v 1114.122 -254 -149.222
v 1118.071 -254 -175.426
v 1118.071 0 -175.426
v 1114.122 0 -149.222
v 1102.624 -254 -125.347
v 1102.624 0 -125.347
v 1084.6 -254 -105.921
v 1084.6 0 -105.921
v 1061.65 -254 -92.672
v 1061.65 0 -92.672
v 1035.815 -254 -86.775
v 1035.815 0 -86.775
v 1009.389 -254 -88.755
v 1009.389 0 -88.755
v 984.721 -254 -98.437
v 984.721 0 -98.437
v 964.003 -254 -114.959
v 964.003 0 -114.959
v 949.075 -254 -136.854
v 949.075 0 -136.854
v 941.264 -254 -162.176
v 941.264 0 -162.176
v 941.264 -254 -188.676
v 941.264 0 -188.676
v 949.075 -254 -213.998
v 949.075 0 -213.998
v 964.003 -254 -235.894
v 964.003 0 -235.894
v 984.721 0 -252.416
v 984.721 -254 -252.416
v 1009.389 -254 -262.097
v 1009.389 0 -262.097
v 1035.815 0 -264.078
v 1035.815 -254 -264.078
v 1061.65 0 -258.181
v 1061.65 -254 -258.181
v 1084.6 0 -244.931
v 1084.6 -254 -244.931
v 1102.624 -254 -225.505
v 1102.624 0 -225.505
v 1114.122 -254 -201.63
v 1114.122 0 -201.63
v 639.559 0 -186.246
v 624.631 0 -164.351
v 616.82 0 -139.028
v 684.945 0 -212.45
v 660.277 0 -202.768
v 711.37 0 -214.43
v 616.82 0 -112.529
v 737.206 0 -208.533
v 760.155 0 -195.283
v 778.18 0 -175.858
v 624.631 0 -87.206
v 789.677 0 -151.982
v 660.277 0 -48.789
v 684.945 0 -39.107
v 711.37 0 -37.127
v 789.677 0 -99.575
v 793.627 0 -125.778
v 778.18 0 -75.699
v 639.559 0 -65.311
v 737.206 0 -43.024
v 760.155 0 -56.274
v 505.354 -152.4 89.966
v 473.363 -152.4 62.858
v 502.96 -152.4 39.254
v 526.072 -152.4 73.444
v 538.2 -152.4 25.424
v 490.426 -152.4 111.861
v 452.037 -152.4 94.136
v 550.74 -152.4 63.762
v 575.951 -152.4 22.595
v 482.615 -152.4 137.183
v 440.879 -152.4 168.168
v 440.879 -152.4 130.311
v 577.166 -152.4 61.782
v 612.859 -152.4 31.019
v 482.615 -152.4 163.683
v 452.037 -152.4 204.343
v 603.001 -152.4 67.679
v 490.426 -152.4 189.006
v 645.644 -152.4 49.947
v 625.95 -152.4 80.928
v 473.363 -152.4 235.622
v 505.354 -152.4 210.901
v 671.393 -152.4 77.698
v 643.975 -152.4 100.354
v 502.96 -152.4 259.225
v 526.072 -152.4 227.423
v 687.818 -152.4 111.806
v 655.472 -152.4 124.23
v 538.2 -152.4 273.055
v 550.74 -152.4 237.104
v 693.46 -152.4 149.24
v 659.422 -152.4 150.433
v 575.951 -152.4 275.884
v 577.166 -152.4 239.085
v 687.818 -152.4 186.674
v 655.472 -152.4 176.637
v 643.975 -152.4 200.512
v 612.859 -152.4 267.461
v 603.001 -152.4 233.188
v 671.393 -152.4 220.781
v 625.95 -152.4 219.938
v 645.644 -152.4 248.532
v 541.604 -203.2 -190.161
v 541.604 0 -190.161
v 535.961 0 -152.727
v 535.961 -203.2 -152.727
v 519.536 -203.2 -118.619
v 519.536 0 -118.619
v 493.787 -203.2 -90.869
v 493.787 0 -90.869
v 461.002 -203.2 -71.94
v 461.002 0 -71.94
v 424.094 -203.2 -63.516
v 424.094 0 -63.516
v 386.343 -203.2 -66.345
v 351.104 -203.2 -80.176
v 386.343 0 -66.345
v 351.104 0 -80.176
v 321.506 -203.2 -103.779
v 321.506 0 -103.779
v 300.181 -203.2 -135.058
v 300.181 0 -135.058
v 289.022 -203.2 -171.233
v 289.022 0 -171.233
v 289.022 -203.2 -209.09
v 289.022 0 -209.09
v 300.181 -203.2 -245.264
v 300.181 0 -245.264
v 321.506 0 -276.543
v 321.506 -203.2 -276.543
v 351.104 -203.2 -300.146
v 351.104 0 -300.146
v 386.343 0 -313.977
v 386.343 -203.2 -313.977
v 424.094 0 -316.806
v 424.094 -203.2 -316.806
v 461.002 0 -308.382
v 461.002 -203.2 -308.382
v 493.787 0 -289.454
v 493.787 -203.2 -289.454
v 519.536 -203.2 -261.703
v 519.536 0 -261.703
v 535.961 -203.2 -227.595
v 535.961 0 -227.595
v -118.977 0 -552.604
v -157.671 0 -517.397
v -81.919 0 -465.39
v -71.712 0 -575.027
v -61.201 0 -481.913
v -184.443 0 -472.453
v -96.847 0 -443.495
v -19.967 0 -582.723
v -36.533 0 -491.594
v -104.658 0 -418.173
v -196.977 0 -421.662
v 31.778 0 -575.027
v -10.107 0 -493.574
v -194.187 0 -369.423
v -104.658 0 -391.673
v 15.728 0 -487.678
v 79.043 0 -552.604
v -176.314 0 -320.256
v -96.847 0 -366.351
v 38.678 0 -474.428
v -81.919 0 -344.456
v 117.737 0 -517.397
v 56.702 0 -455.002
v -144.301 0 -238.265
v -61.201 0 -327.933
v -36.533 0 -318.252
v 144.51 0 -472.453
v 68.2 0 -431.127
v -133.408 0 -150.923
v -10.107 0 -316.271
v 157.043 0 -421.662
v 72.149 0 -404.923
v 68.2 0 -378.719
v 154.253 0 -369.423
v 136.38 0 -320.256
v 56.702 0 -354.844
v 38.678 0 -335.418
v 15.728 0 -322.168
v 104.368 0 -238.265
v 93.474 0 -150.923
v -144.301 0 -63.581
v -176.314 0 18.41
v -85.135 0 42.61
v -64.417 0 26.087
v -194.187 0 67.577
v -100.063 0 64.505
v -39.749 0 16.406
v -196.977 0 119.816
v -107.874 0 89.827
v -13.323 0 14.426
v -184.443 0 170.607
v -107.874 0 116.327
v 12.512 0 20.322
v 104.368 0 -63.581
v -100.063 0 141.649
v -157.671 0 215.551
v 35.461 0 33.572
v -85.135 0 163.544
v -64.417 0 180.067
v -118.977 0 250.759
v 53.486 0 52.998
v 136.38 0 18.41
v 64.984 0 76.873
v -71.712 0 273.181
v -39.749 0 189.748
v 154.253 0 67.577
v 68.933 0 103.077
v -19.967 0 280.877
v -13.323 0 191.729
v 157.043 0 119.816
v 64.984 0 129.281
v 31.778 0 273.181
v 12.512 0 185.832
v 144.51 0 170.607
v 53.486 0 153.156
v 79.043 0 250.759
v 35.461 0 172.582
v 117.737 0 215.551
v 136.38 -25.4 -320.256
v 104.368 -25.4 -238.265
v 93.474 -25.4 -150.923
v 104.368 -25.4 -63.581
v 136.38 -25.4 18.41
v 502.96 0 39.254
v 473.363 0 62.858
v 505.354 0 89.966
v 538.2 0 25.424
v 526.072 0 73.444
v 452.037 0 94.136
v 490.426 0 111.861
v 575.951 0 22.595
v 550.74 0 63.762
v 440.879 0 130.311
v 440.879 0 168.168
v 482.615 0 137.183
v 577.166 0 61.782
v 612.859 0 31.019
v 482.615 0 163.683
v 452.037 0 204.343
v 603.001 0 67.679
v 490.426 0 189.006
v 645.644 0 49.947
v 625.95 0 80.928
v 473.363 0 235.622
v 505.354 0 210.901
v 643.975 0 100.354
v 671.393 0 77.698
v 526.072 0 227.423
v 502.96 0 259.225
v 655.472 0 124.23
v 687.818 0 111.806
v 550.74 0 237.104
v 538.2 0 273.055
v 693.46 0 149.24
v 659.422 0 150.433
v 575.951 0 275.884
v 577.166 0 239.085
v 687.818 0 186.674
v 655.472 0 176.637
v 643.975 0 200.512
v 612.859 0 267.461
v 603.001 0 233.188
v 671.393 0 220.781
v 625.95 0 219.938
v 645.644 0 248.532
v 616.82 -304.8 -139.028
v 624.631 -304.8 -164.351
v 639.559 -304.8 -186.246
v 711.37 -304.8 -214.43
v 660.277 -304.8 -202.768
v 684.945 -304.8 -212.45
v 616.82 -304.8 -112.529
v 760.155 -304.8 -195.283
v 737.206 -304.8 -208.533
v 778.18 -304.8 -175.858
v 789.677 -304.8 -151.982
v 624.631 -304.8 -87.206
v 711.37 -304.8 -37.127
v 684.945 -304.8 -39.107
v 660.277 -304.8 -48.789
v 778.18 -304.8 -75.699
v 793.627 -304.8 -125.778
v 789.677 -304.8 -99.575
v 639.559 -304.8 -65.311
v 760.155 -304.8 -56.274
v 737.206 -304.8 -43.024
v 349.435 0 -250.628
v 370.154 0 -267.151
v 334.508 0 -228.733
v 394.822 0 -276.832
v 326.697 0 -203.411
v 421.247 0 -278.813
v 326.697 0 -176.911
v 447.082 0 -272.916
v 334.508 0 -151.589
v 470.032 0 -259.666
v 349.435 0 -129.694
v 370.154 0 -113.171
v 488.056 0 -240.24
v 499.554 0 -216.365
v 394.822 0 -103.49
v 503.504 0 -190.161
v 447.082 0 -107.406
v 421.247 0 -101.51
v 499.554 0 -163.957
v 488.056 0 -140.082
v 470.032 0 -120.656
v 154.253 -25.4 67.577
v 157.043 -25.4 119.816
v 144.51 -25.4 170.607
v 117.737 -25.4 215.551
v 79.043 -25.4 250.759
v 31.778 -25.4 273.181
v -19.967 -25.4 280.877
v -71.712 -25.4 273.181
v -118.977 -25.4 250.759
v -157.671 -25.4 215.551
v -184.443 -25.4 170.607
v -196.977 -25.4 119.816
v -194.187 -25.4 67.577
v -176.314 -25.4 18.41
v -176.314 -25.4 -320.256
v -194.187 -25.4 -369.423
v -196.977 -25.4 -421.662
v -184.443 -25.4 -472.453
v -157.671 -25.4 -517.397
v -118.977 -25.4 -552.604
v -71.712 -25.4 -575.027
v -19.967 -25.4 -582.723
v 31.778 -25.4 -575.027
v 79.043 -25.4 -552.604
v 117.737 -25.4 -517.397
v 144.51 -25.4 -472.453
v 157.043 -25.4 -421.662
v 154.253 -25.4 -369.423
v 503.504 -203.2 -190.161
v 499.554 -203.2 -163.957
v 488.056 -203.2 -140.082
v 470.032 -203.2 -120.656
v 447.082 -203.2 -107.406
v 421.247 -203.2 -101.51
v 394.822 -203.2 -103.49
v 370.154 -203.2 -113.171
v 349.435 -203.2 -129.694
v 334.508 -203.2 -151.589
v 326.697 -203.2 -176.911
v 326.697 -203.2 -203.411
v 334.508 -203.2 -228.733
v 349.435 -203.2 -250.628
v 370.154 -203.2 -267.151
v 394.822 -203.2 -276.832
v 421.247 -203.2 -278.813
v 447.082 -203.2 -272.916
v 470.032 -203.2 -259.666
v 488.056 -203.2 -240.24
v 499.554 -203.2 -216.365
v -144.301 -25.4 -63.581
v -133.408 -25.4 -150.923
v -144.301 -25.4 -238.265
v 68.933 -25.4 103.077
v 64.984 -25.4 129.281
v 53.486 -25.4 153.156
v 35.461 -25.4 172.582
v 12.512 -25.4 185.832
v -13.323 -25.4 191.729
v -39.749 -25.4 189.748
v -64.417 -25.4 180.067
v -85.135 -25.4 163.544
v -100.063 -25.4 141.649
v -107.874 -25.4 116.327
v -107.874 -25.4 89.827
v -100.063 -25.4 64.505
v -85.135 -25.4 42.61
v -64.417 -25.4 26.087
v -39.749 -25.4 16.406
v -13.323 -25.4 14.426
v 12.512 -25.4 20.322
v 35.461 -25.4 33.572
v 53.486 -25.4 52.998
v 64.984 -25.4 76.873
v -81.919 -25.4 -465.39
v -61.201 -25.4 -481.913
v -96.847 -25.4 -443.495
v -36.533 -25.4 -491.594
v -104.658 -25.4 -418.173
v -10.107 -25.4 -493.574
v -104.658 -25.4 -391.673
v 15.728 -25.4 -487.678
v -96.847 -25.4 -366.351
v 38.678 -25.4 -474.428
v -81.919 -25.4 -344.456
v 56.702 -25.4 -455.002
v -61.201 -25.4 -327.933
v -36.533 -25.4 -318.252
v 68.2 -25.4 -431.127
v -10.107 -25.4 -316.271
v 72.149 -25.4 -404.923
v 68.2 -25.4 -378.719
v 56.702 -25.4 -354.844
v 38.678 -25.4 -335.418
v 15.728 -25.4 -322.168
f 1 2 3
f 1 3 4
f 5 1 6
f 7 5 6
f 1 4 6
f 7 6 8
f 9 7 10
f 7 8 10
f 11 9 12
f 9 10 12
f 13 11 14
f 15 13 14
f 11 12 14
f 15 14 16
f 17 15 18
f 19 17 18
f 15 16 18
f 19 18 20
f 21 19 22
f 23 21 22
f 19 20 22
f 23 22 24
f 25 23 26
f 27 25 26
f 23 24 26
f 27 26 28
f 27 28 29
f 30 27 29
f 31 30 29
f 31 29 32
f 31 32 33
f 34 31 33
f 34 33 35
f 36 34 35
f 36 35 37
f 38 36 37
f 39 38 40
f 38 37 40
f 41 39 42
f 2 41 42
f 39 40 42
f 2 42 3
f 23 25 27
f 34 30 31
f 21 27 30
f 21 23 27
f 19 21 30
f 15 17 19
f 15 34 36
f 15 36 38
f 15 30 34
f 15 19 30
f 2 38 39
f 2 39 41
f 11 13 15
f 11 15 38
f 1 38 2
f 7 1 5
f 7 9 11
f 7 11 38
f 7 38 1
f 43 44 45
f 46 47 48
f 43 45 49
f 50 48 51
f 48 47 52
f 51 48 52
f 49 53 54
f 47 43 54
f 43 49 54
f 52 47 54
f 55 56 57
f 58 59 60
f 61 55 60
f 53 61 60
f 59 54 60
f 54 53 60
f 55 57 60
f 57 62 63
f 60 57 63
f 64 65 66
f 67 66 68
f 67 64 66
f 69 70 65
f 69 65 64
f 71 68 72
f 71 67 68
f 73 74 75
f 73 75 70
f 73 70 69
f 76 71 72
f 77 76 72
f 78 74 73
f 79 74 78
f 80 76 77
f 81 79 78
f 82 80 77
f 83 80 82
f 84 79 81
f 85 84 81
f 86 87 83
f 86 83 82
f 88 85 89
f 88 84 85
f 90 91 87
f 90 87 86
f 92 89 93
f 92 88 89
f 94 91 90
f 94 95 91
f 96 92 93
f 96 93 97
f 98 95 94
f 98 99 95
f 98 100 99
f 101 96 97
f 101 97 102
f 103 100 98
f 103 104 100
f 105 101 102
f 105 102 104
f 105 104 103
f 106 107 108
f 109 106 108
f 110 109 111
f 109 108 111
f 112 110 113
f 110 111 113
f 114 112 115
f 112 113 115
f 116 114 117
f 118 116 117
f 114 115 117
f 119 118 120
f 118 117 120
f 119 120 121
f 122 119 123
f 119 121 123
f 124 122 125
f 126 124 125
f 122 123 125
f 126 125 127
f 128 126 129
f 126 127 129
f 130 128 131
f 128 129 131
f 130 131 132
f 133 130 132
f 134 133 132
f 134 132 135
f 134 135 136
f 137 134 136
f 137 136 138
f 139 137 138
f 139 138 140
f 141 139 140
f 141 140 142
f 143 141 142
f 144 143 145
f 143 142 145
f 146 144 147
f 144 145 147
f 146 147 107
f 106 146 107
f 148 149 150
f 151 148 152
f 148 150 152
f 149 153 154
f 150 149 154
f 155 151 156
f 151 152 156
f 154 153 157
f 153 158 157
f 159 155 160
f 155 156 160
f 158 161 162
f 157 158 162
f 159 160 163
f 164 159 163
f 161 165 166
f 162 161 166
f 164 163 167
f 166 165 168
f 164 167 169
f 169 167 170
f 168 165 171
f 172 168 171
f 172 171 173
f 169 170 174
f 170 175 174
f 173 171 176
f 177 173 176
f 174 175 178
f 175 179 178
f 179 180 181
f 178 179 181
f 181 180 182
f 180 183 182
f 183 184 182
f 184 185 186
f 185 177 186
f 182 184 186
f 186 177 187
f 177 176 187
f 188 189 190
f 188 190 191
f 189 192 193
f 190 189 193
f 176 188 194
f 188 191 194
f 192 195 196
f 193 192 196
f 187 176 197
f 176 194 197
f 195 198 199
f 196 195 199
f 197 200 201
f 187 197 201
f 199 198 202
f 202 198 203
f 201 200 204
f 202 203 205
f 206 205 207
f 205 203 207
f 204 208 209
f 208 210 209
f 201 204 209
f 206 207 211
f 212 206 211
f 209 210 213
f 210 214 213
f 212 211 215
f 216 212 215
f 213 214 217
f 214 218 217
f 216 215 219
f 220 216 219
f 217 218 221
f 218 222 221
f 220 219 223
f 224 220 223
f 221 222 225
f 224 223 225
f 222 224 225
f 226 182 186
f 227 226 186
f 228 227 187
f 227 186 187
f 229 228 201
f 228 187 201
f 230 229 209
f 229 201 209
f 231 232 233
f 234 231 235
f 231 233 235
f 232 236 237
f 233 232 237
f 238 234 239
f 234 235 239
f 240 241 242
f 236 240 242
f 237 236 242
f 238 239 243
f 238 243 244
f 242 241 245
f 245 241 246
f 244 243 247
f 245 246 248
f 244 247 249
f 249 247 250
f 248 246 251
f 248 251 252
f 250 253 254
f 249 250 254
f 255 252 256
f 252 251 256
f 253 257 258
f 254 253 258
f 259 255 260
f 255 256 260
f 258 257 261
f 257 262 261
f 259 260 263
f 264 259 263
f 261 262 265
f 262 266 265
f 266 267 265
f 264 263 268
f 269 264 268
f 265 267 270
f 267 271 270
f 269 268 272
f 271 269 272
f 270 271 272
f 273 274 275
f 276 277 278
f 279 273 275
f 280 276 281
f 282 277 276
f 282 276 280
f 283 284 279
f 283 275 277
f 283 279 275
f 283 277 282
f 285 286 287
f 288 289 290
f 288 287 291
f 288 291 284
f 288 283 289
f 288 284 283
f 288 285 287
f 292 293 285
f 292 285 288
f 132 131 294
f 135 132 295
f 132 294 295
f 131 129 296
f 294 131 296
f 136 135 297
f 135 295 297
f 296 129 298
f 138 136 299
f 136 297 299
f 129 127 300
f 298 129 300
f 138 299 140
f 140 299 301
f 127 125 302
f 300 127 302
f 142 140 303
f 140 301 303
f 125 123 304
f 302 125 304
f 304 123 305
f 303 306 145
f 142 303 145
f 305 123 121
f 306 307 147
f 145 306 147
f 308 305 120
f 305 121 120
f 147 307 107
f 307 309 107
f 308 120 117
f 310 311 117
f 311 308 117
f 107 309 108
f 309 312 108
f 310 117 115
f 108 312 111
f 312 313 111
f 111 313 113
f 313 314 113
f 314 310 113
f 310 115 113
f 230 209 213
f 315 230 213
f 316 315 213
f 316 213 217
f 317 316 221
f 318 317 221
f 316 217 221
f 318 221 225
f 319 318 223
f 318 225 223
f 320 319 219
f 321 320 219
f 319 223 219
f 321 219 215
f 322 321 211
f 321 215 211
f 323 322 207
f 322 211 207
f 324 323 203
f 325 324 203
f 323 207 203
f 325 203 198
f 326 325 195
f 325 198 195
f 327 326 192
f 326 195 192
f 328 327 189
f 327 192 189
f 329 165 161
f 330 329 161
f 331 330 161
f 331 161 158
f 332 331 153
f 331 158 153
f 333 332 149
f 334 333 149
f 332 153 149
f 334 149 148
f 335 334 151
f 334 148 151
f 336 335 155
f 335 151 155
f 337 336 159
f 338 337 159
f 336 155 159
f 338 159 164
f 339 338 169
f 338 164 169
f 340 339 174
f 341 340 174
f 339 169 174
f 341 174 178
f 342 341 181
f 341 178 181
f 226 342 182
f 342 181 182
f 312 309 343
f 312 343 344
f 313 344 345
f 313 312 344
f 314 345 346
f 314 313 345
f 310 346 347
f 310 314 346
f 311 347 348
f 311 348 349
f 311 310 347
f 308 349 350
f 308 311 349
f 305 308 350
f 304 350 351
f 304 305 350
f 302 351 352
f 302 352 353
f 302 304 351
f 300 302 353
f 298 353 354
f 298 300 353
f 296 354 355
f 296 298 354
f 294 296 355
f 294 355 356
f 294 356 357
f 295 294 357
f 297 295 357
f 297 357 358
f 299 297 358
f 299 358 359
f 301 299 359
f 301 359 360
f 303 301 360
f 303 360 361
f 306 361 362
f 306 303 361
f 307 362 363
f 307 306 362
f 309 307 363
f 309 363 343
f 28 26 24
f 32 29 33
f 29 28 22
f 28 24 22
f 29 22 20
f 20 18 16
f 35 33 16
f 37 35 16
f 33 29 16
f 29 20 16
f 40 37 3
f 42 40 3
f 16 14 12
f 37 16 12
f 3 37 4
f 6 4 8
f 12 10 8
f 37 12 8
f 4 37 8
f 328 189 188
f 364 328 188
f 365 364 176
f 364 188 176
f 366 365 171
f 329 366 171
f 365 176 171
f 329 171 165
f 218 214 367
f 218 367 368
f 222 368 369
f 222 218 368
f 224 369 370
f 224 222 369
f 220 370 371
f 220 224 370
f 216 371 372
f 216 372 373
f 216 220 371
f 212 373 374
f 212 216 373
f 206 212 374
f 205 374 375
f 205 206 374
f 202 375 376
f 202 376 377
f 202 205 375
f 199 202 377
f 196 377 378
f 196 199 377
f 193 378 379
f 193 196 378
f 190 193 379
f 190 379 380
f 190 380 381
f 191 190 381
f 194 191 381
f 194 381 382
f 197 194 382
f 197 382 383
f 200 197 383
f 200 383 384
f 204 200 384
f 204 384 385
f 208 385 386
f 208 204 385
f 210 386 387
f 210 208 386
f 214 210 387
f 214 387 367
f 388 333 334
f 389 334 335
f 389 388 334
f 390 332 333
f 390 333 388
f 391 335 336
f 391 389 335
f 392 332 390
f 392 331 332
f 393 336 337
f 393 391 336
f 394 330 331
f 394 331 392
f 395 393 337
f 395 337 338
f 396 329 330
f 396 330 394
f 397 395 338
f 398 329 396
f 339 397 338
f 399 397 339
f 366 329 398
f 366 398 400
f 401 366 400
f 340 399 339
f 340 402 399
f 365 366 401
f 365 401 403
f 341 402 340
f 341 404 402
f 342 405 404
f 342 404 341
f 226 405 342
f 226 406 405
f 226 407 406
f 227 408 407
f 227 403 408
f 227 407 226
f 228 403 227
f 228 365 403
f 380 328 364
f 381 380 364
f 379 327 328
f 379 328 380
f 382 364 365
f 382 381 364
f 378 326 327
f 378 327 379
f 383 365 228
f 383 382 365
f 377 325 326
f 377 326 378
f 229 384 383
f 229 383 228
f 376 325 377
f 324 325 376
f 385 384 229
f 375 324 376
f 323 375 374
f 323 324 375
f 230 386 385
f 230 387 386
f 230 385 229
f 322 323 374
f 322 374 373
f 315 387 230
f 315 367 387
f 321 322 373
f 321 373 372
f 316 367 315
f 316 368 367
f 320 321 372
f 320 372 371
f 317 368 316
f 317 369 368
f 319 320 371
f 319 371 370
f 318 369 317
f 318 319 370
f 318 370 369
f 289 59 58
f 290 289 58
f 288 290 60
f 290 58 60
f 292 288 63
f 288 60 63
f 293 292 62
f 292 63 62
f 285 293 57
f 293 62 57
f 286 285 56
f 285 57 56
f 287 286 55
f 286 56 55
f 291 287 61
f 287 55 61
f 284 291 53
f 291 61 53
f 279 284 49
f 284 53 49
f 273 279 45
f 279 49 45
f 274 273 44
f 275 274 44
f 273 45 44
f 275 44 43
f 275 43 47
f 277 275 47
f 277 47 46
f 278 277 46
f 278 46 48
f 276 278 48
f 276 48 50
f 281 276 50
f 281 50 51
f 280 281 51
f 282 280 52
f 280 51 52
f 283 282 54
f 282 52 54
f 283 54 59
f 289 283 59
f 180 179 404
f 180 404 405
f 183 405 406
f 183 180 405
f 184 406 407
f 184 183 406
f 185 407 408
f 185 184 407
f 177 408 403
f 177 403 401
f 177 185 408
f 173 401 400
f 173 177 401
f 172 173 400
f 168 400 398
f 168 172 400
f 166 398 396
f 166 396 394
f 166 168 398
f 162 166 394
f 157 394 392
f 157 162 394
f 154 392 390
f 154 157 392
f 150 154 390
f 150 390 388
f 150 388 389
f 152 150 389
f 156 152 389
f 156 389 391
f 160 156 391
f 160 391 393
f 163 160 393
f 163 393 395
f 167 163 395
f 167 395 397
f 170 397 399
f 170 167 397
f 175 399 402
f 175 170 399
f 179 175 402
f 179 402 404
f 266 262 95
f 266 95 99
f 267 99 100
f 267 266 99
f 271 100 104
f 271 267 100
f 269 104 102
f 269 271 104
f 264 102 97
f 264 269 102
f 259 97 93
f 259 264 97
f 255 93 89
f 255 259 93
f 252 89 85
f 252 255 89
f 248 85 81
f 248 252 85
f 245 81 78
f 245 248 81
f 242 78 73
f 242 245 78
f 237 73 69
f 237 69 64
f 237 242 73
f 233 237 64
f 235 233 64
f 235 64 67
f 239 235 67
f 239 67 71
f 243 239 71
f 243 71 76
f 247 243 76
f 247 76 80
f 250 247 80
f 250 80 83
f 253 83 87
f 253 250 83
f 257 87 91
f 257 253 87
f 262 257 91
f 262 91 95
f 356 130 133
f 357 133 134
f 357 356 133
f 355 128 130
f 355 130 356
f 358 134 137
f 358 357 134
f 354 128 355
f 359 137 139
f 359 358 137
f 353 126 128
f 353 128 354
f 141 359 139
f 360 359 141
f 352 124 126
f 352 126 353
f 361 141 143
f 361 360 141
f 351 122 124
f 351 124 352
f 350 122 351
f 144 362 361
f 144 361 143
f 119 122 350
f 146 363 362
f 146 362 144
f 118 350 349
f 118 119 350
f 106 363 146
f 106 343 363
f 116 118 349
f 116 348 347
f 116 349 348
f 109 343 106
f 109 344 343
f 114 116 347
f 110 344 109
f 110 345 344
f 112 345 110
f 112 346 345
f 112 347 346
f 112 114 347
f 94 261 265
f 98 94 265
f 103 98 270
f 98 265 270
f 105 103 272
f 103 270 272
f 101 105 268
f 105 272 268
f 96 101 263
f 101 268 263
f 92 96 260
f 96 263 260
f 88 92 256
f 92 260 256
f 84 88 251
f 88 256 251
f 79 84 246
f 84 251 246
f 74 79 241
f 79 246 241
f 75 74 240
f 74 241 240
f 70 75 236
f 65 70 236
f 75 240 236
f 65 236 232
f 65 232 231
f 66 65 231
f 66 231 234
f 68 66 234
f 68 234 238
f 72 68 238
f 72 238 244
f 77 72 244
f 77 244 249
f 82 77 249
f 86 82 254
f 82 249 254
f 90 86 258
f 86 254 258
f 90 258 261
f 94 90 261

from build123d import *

# Parameters (mm, degrees)
F0_R     = 88.9
F1_DEPTH = 25.4
F2_R     = 88.9
F3_DEPTH = 254
F4_R     = 88.9
F5_DEPTH = 304.8
F6_R     = 127
F6_R_2   = 88.9
F7_DEPTH = 152.4
F8_R     = 127
F8_R_2   = 88.9
F9_DEPTH = 203.2


with BuildPart() as f1:
    # F0 (on Front) → F1 (new body)
    with BuildSketch(Plane.XZ):
        with BuildLine():
            ThreePointArc((136.380191, -320.256206), (93.474262, -150.922873), (136.380191, 18.410461))
            ThreePointArc((136.380191, 18.410461), (-19.966844, 280.877127), (-176.31388, 18.410461))
            ThreePointArc((-176.31388, 18.410461), (-133.407951, -150.922873), (-176.31388, -320.256206))
            ThreePointArc((-176.31388, -320.256206), (-19.966844, -582.722873), (136.380191, -320.256206))
        make_face()
        with Locations((-16.750693, -404.922873)):
            Circle(F0_R, mode=Mode.SUBTRACT)
        with Locations((-19.966844, 103.077127)):
            Circle(F0_R, mode=Mode.SUBTRACT)
    extrude(amount=F1_DEPTH)


with BuildPart() as f3:
    # F2 (on Front) → F3 (new body)
    with BuildSketch(Plane.XZ):
        with Locations((1029.171348, -175.426185)):
            Circle(F2_R)
    extrude(amount=F3_DEPTH)


with BuildPart() as f5:
    # F4 (on Front) → F5 (new body)
    with BuildSketch(Plane.XZ):
        with Locations((704.726934, -125.778481)):
            Circle(F4_R)
    extrude(amount=F5_DEPTH)


with BuildPart() as f7:
    # F6 (on Front) → F7 (new body)
    with BuildSketch(Plane.XZ):
        with Locations((566.460431, 149.239615)):
            Circle(F6_R)
        with Locations((570.522005, 150.433258)):
            Circle(F6_R_2, mode=Mode.SUBTRACT)
    extrude(amount=F7_DEPTH)


with BuildPart() as f9:
    # F8 (on Front) → F9 (new body)
    with BuildSketch(Plane.XZ):
        with Locations((414.603651, -190.161139)):
            Circle(F8_R)
        with Locations((414.603651, -190.161139)):
            Circle(F8_R_2, mode=Mode.SUBTRACT)
    extrude(amount=F9_DEPTH)


solid = Compound([f1.part, f3.part, f5.part, f7.part, f9.part])
